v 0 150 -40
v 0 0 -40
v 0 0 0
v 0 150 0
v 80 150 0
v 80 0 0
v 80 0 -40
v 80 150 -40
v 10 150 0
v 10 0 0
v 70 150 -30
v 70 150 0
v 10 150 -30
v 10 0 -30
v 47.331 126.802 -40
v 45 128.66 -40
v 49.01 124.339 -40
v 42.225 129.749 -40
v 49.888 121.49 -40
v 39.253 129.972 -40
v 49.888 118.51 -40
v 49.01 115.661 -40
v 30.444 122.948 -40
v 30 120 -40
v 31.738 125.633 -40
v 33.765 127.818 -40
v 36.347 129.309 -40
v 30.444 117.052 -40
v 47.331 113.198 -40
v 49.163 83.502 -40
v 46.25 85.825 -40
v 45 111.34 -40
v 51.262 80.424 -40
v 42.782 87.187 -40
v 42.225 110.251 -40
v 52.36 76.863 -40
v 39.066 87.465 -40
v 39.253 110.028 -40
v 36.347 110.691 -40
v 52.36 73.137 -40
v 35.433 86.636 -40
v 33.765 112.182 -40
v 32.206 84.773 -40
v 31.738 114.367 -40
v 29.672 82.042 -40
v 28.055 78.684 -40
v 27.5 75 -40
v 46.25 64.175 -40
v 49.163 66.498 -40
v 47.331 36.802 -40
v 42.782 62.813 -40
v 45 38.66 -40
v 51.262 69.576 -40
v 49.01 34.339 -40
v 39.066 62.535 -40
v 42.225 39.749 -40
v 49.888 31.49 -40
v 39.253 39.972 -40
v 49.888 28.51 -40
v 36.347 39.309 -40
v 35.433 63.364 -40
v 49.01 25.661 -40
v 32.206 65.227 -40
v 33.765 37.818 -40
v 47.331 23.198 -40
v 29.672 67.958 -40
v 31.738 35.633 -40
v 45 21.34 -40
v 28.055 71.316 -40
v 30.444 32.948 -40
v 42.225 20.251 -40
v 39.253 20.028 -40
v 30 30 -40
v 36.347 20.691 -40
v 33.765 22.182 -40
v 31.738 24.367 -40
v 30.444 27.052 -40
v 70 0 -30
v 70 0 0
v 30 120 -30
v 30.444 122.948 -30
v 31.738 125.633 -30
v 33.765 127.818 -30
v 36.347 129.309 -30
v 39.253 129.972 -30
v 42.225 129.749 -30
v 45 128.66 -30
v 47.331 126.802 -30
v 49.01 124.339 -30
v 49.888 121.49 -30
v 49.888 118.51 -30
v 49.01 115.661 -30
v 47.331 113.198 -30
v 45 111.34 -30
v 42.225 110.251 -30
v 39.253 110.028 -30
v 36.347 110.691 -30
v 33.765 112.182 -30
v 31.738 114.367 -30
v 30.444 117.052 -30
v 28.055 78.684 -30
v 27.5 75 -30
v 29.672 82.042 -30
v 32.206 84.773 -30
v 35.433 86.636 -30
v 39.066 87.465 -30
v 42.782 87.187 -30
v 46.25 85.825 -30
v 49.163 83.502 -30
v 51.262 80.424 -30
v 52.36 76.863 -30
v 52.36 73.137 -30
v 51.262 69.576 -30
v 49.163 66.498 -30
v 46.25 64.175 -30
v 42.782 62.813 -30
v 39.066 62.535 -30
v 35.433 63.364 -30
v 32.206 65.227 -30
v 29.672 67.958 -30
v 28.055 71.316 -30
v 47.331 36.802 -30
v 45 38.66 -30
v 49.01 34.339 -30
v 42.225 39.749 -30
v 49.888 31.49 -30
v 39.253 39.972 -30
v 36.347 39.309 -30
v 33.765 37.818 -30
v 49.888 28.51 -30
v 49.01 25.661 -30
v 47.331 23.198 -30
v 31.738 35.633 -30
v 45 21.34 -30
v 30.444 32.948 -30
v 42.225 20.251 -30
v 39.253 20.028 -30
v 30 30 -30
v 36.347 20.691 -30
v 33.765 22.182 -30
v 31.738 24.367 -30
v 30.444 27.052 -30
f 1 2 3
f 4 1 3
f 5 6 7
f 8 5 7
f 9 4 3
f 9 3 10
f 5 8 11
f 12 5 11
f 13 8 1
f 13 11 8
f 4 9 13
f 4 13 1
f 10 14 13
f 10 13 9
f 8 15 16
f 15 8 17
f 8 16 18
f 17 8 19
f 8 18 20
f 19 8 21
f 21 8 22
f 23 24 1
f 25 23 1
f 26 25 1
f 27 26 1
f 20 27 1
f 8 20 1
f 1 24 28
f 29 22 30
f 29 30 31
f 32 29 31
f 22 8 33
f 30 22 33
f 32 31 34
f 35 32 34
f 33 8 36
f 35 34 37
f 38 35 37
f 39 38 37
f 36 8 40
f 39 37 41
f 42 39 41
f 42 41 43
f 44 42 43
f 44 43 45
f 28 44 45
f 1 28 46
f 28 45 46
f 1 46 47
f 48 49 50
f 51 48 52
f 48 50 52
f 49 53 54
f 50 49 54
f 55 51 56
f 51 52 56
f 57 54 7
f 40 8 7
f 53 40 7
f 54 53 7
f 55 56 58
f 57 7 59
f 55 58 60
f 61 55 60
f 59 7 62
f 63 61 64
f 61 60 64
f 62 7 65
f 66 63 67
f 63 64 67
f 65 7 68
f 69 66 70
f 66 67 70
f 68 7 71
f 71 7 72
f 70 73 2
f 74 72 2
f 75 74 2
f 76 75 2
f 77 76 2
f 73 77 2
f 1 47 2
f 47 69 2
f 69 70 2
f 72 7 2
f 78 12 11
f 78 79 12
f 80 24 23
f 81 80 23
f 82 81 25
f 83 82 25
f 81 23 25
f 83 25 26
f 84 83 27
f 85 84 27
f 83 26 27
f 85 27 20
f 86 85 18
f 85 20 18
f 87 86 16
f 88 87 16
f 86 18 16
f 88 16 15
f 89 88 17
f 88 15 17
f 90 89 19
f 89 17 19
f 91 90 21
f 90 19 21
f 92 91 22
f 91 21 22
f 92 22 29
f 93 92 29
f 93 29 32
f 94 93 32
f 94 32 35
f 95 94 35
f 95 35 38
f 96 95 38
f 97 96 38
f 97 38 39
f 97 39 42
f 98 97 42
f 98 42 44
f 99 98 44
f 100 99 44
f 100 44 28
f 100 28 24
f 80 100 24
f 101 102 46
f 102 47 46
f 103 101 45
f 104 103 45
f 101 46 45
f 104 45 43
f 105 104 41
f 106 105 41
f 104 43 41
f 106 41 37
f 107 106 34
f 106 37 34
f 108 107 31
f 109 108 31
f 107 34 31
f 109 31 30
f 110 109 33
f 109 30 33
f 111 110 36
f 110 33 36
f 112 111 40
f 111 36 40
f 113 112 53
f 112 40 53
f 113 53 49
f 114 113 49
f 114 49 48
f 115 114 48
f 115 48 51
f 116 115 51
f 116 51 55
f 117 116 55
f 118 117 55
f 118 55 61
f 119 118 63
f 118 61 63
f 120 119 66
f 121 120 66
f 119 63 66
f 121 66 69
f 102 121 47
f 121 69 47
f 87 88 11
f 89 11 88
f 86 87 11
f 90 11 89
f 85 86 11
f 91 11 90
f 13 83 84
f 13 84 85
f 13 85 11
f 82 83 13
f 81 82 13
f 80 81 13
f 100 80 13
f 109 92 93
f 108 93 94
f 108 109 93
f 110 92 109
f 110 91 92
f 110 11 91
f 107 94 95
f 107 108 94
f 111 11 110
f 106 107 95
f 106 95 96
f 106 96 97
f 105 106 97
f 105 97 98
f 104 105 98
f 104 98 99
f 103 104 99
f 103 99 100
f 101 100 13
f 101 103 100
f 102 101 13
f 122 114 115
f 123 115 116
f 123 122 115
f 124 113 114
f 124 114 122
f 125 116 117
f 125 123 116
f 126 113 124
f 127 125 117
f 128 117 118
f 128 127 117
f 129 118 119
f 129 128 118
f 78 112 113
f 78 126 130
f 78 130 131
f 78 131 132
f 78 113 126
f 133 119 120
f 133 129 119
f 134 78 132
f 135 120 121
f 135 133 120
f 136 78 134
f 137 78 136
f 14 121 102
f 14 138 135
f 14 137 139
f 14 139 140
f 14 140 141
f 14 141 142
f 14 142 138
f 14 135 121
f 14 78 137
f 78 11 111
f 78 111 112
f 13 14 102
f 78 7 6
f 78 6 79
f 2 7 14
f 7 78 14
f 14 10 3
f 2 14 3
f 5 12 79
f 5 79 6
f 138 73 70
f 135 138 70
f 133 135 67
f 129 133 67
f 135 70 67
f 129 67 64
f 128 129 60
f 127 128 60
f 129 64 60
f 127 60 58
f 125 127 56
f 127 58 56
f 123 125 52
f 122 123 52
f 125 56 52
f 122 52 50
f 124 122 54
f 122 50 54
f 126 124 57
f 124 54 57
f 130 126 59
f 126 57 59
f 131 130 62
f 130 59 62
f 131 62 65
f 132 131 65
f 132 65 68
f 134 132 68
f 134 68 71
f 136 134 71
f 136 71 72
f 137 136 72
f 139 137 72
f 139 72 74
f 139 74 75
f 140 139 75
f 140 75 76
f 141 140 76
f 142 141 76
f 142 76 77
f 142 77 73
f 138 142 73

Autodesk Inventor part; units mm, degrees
ref_plane "YZ Plane" through (0, 0, 0) normal (1, 0, 0) x (0, 1, 0)
ref_plane "XZ Plane" through (0, 0, 0) normal (0, 1, 0) x (-1, 0, 0)
ref_plane "XY Plane" through (0, 0, 0) normal (0, 0, 1) x (1, 0, 0)
sketch "Boceto1" plane through (0, 0, 0) normal (0, 1, 0) x (-1, 0, 0)
  line L0 (0, 0) -> (-80, 0)
  line L1 (-80, 0) -> (-80, -40)
  line L2 (-80, -40) -> (0, -40)
  line L3 (0, -40) -> (0, 0)
  line L4 (-10, 0) -> (-70, 0)
  line L5 (-70, 0) -> (-70, -30)
  line L6 (-70, -30) -> (-10, -30)
  line L7 (-10, -30) -> (-10, 0)
  dimension "d0" = 80
  dimension "d1" = 40
  dimension "d2" = 60
  dimension "d3" = 30
extrude "Extrusión1" add sketch "Boceto1" along normal blind 150 contours L3 L2 L1 L0 L5 L6 L7
sketch "Boceto2" plane through (80, 0, -40) normal (0, 0, -1) x (-1, 0, 0)
  circle A0 centre (40, 120) radius 10
  circle A1 centre (40, 30) radius 10
  line L0 (0, 0) -> (80, 0) projected
  line L1 (80, 0) -> (80, 150) projected
  circle A2 centre (40, 75) radius 12.5
  dimension "d6" = 20
  dimension "d7" = 20
  dimension "d8" = 120
  dimension "d9" = 40
  dimension "d10" = 40
  dimension "d11" = 25
  dimension "d12" = 40
  dimension "d13" = 75
  dimension "d14" = 30
extrude "Extrusión2" cut sketch "Boceto2" against normal blind 150
properties part number "anclaje"
